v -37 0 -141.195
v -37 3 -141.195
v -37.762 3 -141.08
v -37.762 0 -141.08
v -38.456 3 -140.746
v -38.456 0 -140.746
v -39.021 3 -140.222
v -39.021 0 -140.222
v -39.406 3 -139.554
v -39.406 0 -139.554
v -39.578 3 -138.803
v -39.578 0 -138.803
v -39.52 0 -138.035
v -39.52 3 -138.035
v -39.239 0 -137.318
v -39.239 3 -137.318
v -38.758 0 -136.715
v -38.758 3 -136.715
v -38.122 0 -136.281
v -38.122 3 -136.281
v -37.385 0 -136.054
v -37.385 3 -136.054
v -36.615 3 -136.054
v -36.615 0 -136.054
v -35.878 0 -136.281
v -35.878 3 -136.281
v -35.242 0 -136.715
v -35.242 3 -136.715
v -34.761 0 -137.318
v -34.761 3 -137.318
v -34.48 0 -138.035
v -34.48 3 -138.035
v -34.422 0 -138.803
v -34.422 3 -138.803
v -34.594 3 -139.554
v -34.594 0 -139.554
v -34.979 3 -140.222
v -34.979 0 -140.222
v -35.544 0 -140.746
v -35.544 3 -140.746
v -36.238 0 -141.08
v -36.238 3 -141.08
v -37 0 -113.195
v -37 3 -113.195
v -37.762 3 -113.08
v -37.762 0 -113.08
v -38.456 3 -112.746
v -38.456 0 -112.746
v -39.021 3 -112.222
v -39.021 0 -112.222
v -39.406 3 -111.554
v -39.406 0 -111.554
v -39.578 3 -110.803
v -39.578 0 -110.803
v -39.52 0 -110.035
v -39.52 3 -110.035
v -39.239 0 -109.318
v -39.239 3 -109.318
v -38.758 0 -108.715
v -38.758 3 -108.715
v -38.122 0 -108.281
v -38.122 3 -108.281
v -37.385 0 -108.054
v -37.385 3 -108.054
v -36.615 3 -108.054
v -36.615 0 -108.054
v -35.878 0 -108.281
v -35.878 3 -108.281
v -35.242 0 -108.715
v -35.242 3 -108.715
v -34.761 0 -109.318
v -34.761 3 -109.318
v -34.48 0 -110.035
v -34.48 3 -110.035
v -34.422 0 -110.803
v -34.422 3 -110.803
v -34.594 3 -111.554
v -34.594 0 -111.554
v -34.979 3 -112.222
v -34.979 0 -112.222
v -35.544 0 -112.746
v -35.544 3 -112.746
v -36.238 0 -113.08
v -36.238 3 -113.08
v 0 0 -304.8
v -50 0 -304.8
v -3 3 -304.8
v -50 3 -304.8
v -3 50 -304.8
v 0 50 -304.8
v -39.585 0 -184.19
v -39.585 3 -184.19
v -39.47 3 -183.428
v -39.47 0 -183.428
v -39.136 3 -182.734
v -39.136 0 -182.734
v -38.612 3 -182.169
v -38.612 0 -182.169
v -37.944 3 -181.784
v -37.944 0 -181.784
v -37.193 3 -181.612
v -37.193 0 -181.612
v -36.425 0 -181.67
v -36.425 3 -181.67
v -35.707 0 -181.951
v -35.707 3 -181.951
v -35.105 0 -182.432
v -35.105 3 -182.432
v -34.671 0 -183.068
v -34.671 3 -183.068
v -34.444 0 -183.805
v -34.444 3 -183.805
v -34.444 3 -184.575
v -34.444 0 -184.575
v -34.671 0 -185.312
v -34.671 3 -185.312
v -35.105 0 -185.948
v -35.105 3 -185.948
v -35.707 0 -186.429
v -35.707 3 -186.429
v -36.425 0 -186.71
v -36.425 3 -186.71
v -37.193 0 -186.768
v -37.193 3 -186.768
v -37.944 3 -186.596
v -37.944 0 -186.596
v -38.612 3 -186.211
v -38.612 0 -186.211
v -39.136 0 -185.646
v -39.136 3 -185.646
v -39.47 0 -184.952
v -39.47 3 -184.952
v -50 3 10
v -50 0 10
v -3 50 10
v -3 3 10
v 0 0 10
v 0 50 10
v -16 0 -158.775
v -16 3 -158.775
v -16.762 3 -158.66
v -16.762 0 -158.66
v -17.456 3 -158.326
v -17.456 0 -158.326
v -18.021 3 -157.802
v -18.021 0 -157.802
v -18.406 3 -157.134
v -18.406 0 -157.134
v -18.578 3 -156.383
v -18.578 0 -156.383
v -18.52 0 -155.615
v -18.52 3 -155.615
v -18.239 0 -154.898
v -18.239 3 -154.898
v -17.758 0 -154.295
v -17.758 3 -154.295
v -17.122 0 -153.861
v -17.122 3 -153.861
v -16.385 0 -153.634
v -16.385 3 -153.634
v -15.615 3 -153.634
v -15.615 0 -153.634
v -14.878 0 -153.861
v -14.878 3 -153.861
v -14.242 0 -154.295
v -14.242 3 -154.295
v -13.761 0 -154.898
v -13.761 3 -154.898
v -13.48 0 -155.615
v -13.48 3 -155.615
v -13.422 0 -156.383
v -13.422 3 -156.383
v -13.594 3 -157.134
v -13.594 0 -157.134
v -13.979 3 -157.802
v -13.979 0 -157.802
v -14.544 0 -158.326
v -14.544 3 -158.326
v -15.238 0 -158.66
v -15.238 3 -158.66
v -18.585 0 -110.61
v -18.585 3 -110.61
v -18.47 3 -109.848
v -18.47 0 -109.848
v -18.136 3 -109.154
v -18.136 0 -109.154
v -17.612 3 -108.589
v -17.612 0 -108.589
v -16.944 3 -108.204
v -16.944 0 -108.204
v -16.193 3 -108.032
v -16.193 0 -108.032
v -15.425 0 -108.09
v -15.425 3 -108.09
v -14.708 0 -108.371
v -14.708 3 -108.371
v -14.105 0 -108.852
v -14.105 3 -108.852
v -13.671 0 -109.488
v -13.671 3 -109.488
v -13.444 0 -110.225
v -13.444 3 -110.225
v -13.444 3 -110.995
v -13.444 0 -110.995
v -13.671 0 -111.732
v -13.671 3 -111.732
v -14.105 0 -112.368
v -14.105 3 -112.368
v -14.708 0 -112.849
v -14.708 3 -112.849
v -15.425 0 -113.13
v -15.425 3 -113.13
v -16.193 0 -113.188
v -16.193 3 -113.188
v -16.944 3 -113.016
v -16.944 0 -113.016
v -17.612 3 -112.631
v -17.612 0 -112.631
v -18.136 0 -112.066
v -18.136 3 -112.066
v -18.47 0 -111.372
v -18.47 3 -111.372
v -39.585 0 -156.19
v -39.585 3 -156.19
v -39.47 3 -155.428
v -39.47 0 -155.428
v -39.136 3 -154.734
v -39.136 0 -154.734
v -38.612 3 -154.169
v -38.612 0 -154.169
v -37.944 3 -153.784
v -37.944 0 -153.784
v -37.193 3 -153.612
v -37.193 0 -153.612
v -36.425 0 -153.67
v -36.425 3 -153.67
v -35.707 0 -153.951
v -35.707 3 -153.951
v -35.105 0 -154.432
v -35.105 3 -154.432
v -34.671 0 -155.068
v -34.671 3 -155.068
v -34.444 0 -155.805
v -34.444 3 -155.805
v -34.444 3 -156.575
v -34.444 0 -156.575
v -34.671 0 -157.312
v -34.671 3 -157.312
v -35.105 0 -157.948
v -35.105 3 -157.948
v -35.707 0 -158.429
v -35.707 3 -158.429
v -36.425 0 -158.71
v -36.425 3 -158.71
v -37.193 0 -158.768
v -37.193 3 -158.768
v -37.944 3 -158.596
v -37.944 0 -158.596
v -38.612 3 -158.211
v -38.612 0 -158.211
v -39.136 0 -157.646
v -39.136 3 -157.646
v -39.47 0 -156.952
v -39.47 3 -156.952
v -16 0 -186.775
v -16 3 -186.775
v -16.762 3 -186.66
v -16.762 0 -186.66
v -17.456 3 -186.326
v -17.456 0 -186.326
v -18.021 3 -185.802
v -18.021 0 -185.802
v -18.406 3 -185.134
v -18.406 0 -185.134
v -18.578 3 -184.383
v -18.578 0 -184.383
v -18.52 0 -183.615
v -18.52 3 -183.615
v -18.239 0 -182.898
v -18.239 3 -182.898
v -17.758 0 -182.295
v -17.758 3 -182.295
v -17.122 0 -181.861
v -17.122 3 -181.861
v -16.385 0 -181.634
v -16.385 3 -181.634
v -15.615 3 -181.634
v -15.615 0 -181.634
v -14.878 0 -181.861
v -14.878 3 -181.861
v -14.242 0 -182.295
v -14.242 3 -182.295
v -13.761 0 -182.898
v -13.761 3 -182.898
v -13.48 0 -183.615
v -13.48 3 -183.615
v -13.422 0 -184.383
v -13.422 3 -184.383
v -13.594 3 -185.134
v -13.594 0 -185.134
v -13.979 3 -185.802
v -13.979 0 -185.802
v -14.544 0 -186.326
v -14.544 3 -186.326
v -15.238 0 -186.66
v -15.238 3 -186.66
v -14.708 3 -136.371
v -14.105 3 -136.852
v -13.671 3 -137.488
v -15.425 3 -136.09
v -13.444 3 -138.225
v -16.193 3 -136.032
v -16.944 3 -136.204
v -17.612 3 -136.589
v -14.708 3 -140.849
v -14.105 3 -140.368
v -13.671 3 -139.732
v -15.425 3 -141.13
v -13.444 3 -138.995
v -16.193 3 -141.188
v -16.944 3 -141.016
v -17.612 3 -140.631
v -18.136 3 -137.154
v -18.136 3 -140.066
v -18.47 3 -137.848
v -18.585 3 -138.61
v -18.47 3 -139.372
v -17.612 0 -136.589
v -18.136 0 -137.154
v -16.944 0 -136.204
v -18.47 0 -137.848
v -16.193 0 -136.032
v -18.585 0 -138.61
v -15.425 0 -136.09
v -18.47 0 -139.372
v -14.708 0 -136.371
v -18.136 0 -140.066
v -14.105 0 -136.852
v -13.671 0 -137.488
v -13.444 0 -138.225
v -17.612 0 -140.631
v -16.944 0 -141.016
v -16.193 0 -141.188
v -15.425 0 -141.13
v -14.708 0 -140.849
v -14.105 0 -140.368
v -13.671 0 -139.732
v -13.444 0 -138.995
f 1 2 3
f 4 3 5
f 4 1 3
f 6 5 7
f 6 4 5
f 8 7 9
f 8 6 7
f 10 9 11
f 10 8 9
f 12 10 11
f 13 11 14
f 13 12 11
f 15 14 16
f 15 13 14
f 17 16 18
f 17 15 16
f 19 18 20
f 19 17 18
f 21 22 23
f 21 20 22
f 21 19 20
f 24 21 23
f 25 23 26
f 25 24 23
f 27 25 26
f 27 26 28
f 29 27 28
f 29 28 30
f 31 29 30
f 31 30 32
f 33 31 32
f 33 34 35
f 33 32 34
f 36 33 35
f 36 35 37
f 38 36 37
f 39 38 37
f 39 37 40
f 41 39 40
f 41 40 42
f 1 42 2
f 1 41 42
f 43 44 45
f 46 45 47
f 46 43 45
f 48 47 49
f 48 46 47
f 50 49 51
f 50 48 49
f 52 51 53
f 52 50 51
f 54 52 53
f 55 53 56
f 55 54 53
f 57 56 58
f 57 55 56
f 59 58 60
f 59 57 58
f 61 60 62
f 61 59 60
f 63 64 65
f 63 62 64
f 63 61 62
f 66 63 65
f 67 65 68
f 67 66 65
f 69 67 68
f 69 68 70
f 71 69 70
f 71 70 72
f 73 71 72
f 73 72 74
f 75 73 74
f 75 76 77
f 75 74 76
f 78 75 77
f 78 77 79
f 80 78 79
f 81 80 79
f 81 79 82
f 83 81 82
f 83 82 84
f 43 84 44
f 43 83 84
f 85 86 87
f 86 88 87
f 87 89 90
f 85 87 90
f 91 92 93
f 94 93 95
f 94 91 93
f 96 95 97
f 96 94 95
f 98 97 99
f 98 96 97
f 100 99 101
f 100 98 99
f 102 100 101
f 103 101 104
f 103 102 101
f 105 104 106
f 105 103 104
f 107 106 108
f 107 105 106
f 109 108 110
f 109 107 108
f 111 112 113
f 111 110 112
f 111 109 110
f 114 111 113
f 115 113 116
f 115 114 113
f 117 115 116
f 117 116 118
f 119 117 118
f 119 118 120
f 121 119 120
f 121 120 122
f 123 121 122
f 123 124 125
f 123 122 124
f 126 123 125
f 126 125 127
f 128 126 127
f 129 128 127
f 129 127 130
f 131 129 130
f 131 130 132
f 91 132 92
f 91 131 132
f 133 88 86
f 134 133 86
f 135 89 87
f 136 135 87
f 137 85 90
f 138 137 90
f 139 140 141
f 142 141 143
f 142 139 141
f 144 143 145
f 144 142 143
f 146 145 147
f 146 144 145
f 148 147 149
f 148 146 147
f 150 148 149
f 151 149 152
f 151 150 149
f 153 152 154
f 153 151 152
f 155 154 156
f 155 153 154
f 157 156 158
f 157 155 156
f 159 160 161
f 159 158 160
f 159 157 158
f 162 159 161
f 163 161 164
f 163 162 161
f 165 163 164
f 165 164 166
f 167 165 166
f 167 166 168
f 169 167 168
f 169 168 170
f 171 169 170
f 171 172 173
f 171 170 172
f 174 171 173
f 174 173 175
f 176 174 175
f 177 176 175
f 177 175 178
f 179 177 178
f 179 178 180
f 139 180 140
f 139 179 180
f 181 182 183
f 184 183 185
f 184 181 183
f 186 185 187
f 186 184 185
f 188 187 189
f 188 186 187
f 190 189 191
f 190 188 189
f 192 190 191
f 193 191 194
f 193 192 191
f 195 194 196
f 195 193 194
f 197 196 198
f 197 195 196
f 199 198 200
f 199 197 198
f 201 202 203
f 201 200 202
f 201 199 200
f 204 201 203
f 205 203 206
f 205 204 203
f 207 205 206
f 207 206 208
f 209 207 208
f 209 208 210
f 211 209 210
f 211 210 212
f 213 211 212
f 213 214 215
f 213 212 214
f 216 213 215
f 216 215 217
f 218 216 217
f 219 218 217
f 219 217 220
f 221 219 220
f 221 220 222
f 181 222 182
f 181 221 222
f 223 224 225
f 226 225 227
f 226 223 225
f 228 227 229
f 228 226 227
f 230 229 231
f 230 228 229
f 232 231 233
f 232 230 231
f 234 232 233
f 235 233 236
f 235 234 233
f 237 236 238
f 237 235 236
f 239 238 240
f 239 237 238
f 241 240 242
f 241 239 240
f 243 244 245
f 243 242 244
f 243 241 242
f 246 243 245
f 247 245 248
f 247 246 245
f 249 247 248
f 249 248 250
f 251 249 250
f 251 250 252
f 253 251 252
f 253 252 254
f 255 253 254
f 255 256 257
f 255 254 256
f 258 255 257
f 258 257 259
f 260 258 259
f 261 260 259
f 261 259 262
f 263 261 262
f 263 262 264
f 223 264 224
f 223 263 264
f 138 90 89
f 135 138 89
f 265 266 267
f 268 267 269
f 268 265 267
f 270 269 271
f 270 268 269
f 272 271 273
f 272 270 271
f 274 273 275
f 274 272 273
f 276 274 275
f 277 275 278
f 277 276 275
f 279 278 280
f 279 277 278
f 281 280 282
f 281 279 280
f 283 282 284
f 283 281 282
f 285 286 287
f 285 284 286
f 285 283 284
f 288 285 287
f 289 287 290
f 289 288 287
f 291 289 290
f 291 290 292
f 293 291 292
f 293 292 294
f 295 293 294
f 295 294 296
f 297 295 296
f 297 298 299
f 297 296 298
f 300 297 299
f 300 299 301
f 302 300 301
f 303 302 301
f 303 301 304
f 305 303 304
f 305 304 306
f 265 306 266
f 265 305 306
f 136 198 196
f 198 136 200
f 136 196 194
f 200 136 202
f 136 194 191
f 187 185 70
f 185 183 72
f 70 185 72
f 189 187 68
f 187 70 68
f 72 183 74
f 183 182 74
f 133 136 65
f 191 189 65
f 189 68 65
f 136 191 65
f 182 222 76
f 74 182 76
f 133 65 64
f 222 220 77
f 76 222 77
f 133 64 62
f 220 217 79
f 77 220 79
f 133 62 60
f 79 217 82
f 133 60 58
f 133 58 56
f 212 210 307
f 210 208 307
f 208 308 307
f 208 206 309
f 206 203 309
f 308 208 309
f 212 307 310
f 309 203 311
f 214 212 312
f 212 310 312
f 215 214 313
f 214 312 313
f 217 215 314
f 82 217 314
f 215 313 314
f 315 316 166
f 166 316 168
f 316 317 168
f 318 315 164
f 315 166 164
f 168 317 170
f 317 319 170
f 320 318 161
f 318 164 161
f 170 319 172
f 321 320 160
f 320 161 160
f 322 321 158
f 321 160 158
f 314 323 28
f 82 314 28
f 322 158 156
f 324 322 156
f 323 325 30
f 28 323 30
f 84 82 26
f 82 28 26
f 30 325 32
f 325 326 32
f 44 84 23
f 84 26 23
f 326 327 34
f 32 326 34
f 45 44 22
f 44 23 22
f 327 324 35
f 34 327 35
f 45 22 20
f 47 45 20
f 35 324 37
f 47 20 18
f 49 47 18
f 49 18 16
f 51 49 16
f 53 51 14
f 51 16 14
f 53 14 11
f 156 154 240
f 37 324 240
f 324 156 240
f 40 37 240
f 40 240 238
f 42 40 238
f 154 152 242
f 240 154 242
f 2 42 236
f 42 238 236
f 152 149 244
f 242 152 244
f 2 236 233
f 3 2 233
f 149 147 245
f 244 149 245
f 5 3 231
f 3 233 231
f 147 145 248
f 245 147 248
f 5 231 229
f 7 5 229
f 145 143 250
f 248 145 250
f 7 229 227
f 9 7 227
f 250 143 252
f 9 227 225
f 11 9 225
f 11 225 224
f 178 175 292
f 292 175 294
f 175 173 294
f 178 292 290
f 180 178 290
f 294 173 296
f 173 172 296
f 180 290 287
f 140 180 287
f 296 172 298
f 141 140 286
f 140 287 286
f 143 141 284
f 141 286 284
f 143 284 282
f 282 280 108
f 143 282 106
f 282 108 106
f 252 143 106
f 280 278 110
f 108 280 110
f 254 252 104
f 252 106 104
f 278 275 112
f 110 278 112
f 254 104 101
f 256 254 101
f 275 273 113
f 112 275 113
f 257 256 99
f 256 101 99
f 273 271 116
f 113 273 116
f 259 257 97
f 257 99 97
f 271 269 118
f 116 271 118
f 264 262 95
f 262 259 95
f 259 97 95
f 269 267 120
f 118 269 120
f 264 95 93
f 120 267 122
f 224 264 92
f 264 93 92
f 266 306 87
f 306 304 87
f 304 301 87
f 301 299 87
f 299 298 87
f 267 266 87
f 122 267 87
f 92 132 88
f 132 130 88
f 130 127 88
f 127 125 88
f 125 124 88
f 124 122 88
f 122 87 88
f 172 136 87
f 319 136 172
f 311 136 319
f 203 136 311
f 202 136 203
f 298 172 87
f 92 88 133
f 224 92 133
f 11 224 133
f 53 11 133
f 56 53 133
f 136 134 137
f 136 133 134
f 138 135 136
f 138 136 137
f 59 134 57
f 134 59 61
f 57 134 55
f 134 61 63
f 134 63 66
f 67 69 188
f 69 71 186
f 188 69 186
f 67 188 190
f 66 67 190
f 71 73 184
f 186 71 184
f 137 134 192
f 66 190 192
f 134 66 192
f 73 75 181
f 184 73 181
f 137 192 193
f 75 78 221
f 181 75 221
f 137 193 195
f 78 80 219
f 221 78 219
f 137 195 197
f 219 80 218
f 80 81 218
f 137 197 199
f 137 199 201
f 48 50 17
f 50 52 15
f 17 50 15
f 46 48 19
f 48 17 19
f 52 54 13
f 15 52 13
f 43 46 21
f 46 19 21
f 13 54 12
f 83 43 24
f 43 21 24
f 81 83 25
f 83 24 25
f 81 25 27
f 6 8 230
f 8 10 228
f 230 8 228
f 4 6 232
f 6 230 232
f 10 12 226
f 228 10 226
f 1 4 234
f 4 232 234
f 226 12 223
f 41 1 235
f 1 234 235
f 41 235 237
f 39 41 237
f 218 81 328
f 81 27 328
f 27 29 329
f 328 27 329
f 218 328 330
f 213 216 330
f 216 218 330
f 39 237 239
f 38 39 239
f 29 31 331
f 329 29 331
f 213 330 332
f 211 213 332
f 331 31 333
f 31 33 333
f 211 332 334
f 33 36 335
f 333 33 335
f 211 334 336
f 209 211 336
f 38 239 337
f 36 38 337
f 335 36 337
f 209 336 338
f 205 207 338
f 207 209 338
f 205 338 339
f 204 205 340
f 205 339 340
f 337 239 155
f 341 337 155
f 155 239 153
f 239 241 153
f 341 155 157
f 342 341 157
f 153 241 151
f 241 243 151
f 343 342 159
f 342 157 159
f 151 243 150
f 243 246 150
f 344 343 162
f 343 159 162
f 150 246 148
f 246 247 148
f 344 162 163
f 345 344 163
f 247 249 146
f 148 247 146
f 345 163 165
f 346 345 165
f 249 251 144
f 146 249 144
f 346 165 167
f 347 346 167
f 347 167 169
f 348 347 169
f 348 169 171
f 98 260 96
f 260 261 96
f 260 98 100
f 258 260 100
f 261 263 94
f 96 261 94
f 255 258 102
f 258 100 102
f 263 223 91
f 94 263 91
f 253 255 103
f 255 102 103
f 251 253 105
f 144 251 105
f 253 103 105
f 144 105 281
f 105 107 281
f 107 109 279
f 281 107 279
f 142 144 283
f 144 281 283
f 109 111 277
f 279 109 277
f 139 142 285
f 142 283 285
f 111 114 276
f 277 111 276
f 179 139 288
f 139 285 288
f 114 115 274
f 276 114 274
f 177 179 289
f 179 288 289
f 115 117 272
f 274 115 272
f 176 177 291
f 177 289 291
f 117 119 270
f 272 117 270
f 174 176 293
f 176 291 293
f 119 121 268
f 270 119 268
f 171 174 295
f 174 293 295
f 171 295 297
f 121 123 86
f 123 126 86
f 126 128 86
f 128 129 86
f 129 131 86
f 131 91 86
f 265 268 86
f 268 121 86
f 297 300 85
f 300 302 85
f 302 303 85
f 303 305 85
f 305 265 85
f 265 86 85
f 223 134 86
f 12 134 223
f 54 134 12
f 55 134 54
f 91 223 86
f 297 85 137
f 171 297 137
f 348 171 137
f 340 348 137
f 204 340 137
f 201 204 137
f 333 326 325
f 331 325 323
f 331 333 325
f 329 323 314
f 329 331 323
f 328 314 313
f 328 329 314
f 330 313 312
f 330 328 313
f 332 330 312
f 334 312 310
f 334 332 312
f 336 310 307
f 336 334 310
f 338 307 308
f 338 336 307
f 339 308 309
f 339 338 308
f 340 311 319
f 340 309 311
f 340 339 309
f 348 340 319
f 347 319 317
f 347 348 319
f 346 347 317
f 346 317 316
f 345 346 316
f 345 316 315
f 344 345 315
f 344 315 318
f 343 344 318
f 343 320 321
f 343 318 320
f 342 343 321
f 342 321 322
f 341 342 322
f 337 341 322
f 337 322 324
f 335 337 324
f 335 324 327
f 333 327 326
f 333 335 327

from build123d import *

# Parameters (mm, degrees)
BOSS_EXTRUDE1_DEPTH      = 10
BOSS_EXTRUDE1_DEPTH_BACK = 304.8
SKETCH4_R                = 2.585
CUT_EXTRUDE1_DEPTH       = 313.894614847


with BuildPart() as part:
    # Sketch3 → Boss-Extrude1 (new, two sides: drawn at the far end of the back side and taken through both)
    with BuildSketch(Plane.XY.offset(-BOSS_EXTRUDE1_DEPTH_BACK)):
        Polygon((-50, 0), (0, 0), (0, 50), (-3, 50), (-3, 3), (-50, 3), align=None)
    extrude(amount=BOSS_EXTRUDE1_DEPTH + BOSS_EXTRUDE1_DEPTH_BACK)

    # Sketch4 → Cut-Extrude1 (cut, through all)
    with BuildSketch(Plane(origin=(0, 0, 0), x_dir=(1, 0, 0), z_dir=(0, 1, 0))):
        with Locations(Location((-37, 156.19, 0), (0, 0, 180))):
            Circle(SKETCH4_R)
        with Locations(Location((-16, 156.19, 0), (0, 0, 90))):
            Circle(SKETCH4_R)
        with Locations(Location((-37, 184.19, 0), (0, 0, 180))):
            Circle(SKETCH4_R)
        with Locations(Location((-16, 184.19, 0), (0, 0, 90))):
            Circle(SKETCH4_R)
        with Locations(Location((-37, 110.61, 0), (0, 0, 90))):
            Circle(SKETCH4_R)
        with Locations(Location((-16, 110.61, 0), (0, 0, 180))):
            Circle(SKETCH4_R)
        with Locations(Location((-16, 138.61, 0), (0, 0, 180))):
            Circle(SKETCH4_R)
        with Locations(Location((-37, 138.61, 0), (0, 0, 90))):
            Circle(SKETCH4_R)
    extrude(amount=CUT_EXTRUDE1_DEPTH, mode=Mode.SUBTRACT)


solid = part.part
